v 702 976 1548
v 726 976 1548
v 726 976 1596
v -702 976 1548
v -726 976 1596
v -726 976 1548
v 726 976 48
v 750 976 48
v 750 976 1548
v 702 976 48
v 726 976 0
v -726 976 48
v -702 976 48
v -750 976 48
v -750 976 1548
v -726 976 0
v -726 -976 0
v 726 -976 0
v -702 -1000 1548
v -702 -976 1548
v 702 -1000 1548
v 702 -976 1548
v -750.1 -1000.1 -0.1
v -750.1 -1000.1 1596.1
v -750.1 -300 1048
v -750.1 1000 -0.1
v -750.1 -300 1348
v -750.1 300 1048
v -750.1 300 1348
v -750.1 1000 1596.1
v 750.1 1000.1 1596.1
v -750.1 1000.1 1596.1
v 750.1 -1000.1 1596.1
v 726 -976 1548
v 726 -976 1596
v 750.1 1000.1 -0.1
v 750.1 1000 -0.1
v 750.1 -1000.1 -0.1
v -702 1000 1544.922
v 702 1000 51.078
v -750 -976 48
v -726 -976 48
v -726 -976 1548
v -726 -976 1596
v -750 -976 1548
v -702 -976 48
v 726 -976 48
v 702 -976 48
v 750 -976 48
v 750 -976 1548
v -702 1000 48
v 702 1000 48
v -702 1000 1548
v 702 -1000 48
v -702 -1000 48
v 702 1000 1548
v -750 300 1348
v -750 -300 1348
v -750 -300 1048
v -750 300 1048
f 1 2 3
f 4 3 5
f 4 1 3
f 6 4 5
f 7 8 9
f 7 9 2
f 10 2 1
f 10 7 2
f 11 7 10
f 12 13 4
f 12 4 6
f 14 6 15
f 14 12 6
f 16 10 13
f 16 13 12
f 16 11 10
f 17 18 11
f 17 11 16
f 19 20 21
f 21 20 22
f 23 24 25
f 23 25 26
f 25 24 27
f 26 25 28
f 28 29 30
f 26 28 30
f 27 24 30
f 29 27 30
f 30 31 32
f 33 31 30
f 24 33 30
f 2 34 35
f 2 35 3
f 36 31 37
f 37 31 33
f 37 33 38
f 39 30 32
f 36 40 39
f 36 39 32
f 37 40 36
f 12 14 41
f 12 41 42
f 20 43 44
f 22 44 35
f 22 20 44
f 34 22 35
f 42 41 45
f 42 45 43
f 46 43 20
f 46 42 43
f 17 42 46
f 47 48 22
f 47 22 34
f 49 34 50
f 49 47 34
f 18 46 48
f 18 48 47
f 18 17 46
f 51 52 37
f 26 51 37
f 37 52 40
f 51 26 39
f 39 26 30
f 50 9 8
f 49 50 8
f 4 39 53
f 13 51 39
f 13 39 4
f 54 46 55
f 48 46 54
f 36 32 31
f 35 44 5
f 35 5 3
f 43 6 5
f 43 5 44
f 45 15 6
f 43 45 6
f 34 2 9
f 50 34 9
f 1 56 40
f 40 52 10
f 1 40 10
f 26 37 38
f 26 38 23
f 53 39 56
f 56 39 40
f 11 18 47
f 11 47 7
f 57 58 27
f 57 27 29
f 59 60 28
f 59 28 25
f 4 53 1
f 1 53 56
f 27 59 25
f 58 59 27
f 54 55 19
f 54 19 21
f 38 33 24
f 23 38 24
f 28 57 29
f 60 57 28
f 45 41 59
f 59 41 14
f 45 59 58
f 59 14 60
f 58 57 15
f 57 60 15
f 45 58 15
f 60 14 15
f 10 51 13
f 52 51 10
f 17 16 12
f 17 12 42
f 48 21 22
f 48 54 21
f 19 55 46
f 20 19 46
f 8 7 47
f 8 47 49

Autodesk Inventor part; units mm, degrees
ref_plane "YZ Plane" through (0, 0, 0) normal (1, 0, 0) x (0, 1, 0)
ref_plane "XZ Plane" through (0, 0, 0) normal (0, 1, 0) x (-1, 0, 0)
ref_plane "XY Plane" through (0, 0, 0) normal (0, 0, 1) x (1, 0, 0)
sketch "Sketch5" plane through (0, 0, 0) normal (0, 0, 1) x (1, 0, 0)
  line L0 (750, 1000) -> (-750, 1000)
  line L1 (-750, 1000) -> (-750, -1000)
  line L2 (-750, -1000) -> (750, -1000)
  line L3 (750, -1000) -> (750, 1000)
  line L4 (750, 1000) -> (-750, -1000) construction
  line L5 (-750, 1000) -> (750, -1000) construction
  line L6 (726, 976) -> (-726, 976)
  line L7 (-726, 976) -> (-726, -976)
  line L8 (-726, -976) -> (726, -976)
  line L9 (726, -976) -> (726, 976)
  line L10 (726, 976) -> (-726, -976) construction
  line L11 (-726, 976) -> (726, -976) construction
  point P0 (0, 0)
  dimension "d14" = 2000
  dimension "d15" = 1500
  dimension "d16" = 24
  dimension "d17" = 24
extrude "Extrusion4" add sketch "Sketch5" along normal blind 48
sketch "Sketch6" plane through (0, 0, 48) normal (0, 0, 1) x (1, 0, 0)
  line L0 (-750, 1000) -> (-750, -1000) construction
  line L1 (-750, -1000) -> (750, -1000) construction
  line L2 (750, -1000) -> (750, 1000) construction
  line L3 (750, 1000) -> (-750, 1000) construction
  line L4 (726, 976) -> (726, -976) construction
  line L5 (726, -976) -> (-726, -976) construction
  line L6 (-726, -976) -> (-726, 976) construction
  line L7 (-726, 976) -> (726, 976) construction
  line L8 (750, -1000) -> (702, -1000)
  line L9 (702, -1000) -> (702, -976)
  line L10 (702, -976) -> (750, -976)
  line L11 (750, -976) -> (750, -1000)
  line L12 (-750, -1000) -> (-702, -1000)
  line L13 (-702, -1000) -> (-702, -976)
  line L14 (-702, -976) -> (-750, -976)
  line L15 (-750, -976) -> (-750, -1000)
  line L16 (-750, 1000) -> (-702, 1000)
  line L17 (-702, 1000) -> (-702, 976)
  line L18 (-702, 976) -> (-750, 976)
  line L19 (-750, 976) -> (-750, 1000)
  line L20 (750, 1000) -> (702, 1000)
  line L21 (702, 1000) -> (702, 976)
  line L22 (702, 976) -> (750, 976)
  line L23 (750, 976) -> (750, 1000)
  point P0 (0, 0)
  dimension "d20" = 48
  dimension "d21" = 48
extrude "Extrusion5" add sketch "Sketch6" along normal blind 1500
sketch "Sketch7" plane through (0, 0, 1548) normal (0, 0, 1) x (1, 0, 0)
  line L0 (-702, -976) -> (-702, -1000) construction
  line L1 (-702, -1000) -> (702, -1000) construction
  line L2 (702, -1000) -> (702, -976) construction
  line L3 (702, -976) -> (-702, -976) construction
  line L4 (-726, 976) -> (-750, 976) construction
  line L5 (-750, 976) -> (-750, -976) construction
  line L6 (-750, -976) -> (-726, -976) construction
  line L7 (-726, -976) -> (-726, 976) construction
  line L8 (702, 1000) -> (702, 976) construction
  line L9 (702, 976) -> (750, 976) construction
  line L10 (750, 976) -> (750, 1000) construction
  line L11 (750, 1000) -> (702, 1000) construction
  line L12 (750, 1000) -> (-750, 1000)
  line L13 (-750, 1000) -> (-750, -1000)
  line L14 (-750, -1000) -> (750, -1000)
  line L15 (750, -1000) -> (750, 1000)
  line L16 (-726, -976) -> (726, -976)
  line L17 (726, -976) -> (726, 976)
  line L18 (726, 976) -> (-726, 976)
  line L19 (-726, 976) -> (-726, -976)
  point P0 (0, 0)
  dimension "d24" = 24
extrude "Extrusion6" add sketch "Sketch7" along normal blind 48
sketch "Sketch8" plane through (750, -1000, 0) normal (1, 0, 0) x (0, 0, -1)
  line L0 (-48, 1976) -> (-1548, 1976) construction
  line L1 (-48, 24) -> (-48, 1976) construction
  line L2 (-48, 24) -> (-1548, 24) construction
  line L3 (-1548, 24) -> (-1548, 1976) construction
  line L4 (0, 2000) -> (-1596, 2000) construction
  line L5 (-1596, 0) -> (-1596, 2000) construction
  line L6 (0, 0) -> (-1596, 0) construction
  line L7 (0, 0) -> (0, 2000) construction
  line L8 (-1596, 0) -> (0, 0)
  line L9 (0, 0) -> (0, 2000)
  line L10 (0, 2000) -> (-1596, 2000)
  line L11 (-1596, 2000) -> (-1596, 0)
  point P0 (0, 1000)
extrude "Extrusion7" add sketch "Sketch8" along normal blind 0.1
sketch "Sketch9" plane through (-750, -1000, 0) normal (0, -1, 0) x (1, 0, 0)
  line L0 (1452, 48) -> (1452, 1548) construction
  line L1 (48, 48) -> (1452, 48) construction
  line L2 (48, 48) -> (48, 1548) construction
  line L3 (48, 1548) -> (1452, 1548) construction
  line L4 (0, 1596) -> (1500.1, 1596) construction
  line L5 (0, 0) -> (0, 1596) construction
  line L6 (0, 0) -> (1500.1, 0) construction
  line L7 (1500.1, 1596) -> (1500.1, 0) construction
  line L8 (0, 1596) -> (1500.1, 1596)
  line L9 (1500.1, 1596) -> (1500.1, 0)
  line L10 (1500.1, 0) -> (0, 0)
  line L11 (0, 0) -> (0, 1596)
  point P0 (750, 0)
extrude "Extrusion8" add sketch "Sketch9" along normal blind 0.1
sketch "Sketch10" plane through (-750, 1000, 0) normal (-1, 0, 0) x (0, 0, 1)
  line L0 (0, 0) -> (1596, 0) construction
  line L1 (0, 0) -> (0, -2000.1) construction
  line L2 (1596, -2000.1) -> (0, -2000.1) construction
  line L3 (1596, 0) -> (1596, -2000.1) construction
  line L4 (1548, -24) -> (1548, -1976) construction
  line L5 (48, -1976) -> (1548, -1976) construction
  line L6 (48, -24) -> (48, -1976) construction
  line L7 (48, -24) -> (1548, -24) construction
  line L8 (1596, 0) -> (0, 0)
  line L9 (0, 0) -> (0, -2000.1)
  line L10 (0, -2000.1) -> (1596, -2000.1)
  line L11 (1596, -2000.1) -> (1596, 0)
  line L12 (1348, -700) -> (1048, -700)
  line L13 (1048, -700) -> (1048, -1300)
  line L14 (1048, -1300) -> (1348, -1300)
  line L15 (1348, -1300) -> (1348, -700)
  line L16 (-319.34, -1000) -> (1915.34, -1000) construction
  point P0 (0, -1000)
  dimension "d37" = 600
  dimension "d38" = 300
  dimension "d39" = 300
  dimension "d40" = 1000
extrude "Extrusion9" add sketch "Sketch10" along normal blind 0.1
sketch "Sketch11" plane through (0, 0, 1596) normal (0, 0, 1) x (1, 0, 0)
  line L0 (750.1, -1000.1) -> (-750.1, -1000.1) construction
  line L1 (750.1, 1000) -> (750.1, -1000.1) construction
  line L2 (-750.1, 1000) -> (750.1, 1000) construction
  line L3 (-750.1, -1000.1) -> (-750.1, 1000) construction
  line L4 (-726, -976) -> (-726, 976) construction
  line L5 (-726, 976) -> (726, 976) construction
  line L6 (726, 976) -> (726, -976) construction
  line L7 (726, -976) -> (-726, -976) construction
  line L8 (750.1, 1000) -> (-750.1, 1000)
  line L9 (-750.1, 1000) -> (-750.1, -1000.1)
  line L10 (-750.1, -1000.1) -> (750.1, -1000.1)
  line L11 (750.1, -1000.1) -> (750.1, 1000)
  point P0 (0, 0)
extrude "Extrusion10" add sketch "Sketch11" along normal blind 0.1
sketch "Sketch12" plane through (0, 0, 0) normal (0, 0, -1) x (-1, 0, 0)
  line L0 (750.1, 1000) -> (-750.1, 1000) construction
  line L1 (-750.1, 1000) -> (-750.1, -1000.1) construction
  line L2 (-750.1, -1000.1) -> (750.1, -1000.1) construction
  line L3 (750.1, 1000) -> (750.1, -1000.1) construction
  line L4 (-726, 976) -> (-726, -976) construction
  line L5 (726, 976) -> (-726, 976) construction
  line L6 (726, -976) -> (726, 976) construction
  line L7 (-726, -976) -> (726, -976) construction
  line L8 (750.1, 1000) -> (-750.1, 1000)
  line L9 (-750.1, 1000) -> (-750.1, -1000.1)
  line L10 (-750.1, -1000.1) -> (750.1, -1000.1)
  line L11 (750.1, -1000.1) -> (750.1, 1000)
  point P0 (0, 0)
extrude "Extrusion11" add sketch "Sketch12" along normal blind 0.1
sketch "Sketch13" plane through (-750.1, 1000, 1596.1) normal (0, 1, 0) x (1, 0, 0)
  line L0 (48.1, 1548.1) -> (48.1, 48.1) construction
  line L1 (1452.1, 1548.1) -> (48.1, 1548.1) construction
  line L2 (1452.1, 1548.1) -> (1452.1, 48.1) construction
  line L3 (1452.1, 48.1) -> (48.1, 48.1) construction
  line L4 (1500.2, 0) -> (1500.2, 1596.2) construction
  line L5 (0, 1596.2) -> (1500.2, 1596.2) construction
  line L6 (0, 1596.2) -> (0, 0) construction
  line L7 (1500.2, 0) -> (0, 0) construction
  line L8 (0, 0) -> (1500.2, 1596.2)
  line L9 (1500.2, 0) -> (1500.2, 1596.2)
  line L10 (1500.2, 0) -> (0, 0)
  point P0 (750.1, 1596.1)
extrude "Extrusion12" add sketch "Sketch13" along normal blind 0.1
properties part number "P004_CageDeTest2"
